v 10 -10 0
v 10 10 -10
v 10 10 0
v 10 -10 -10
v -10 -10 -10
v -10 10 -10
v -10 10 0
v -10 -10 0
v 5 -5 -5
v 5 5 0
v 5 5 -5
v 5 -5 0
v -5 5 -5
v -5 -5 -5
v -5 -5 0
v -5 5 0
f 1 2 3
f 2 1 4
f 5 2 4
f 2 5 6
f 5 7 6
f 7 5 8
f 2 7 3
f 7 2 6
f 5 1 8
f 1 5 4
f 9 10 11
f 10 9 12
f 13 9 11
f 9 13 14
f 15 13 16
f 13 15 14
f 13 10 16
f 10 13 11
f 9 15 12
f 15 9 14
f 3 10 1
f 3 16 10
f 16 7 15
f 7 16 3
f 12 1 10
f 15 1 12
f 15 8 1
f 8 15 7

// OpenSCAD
// The inner cube won't render correctly in OpenCSG mode as long as this bug is present
difference() {
  render(convexity=2) difference() {
       cube(20, center = true);
       cube(10, center = true);
  }
  translate([0, 0, 15]) cube(30, center=true);
}
